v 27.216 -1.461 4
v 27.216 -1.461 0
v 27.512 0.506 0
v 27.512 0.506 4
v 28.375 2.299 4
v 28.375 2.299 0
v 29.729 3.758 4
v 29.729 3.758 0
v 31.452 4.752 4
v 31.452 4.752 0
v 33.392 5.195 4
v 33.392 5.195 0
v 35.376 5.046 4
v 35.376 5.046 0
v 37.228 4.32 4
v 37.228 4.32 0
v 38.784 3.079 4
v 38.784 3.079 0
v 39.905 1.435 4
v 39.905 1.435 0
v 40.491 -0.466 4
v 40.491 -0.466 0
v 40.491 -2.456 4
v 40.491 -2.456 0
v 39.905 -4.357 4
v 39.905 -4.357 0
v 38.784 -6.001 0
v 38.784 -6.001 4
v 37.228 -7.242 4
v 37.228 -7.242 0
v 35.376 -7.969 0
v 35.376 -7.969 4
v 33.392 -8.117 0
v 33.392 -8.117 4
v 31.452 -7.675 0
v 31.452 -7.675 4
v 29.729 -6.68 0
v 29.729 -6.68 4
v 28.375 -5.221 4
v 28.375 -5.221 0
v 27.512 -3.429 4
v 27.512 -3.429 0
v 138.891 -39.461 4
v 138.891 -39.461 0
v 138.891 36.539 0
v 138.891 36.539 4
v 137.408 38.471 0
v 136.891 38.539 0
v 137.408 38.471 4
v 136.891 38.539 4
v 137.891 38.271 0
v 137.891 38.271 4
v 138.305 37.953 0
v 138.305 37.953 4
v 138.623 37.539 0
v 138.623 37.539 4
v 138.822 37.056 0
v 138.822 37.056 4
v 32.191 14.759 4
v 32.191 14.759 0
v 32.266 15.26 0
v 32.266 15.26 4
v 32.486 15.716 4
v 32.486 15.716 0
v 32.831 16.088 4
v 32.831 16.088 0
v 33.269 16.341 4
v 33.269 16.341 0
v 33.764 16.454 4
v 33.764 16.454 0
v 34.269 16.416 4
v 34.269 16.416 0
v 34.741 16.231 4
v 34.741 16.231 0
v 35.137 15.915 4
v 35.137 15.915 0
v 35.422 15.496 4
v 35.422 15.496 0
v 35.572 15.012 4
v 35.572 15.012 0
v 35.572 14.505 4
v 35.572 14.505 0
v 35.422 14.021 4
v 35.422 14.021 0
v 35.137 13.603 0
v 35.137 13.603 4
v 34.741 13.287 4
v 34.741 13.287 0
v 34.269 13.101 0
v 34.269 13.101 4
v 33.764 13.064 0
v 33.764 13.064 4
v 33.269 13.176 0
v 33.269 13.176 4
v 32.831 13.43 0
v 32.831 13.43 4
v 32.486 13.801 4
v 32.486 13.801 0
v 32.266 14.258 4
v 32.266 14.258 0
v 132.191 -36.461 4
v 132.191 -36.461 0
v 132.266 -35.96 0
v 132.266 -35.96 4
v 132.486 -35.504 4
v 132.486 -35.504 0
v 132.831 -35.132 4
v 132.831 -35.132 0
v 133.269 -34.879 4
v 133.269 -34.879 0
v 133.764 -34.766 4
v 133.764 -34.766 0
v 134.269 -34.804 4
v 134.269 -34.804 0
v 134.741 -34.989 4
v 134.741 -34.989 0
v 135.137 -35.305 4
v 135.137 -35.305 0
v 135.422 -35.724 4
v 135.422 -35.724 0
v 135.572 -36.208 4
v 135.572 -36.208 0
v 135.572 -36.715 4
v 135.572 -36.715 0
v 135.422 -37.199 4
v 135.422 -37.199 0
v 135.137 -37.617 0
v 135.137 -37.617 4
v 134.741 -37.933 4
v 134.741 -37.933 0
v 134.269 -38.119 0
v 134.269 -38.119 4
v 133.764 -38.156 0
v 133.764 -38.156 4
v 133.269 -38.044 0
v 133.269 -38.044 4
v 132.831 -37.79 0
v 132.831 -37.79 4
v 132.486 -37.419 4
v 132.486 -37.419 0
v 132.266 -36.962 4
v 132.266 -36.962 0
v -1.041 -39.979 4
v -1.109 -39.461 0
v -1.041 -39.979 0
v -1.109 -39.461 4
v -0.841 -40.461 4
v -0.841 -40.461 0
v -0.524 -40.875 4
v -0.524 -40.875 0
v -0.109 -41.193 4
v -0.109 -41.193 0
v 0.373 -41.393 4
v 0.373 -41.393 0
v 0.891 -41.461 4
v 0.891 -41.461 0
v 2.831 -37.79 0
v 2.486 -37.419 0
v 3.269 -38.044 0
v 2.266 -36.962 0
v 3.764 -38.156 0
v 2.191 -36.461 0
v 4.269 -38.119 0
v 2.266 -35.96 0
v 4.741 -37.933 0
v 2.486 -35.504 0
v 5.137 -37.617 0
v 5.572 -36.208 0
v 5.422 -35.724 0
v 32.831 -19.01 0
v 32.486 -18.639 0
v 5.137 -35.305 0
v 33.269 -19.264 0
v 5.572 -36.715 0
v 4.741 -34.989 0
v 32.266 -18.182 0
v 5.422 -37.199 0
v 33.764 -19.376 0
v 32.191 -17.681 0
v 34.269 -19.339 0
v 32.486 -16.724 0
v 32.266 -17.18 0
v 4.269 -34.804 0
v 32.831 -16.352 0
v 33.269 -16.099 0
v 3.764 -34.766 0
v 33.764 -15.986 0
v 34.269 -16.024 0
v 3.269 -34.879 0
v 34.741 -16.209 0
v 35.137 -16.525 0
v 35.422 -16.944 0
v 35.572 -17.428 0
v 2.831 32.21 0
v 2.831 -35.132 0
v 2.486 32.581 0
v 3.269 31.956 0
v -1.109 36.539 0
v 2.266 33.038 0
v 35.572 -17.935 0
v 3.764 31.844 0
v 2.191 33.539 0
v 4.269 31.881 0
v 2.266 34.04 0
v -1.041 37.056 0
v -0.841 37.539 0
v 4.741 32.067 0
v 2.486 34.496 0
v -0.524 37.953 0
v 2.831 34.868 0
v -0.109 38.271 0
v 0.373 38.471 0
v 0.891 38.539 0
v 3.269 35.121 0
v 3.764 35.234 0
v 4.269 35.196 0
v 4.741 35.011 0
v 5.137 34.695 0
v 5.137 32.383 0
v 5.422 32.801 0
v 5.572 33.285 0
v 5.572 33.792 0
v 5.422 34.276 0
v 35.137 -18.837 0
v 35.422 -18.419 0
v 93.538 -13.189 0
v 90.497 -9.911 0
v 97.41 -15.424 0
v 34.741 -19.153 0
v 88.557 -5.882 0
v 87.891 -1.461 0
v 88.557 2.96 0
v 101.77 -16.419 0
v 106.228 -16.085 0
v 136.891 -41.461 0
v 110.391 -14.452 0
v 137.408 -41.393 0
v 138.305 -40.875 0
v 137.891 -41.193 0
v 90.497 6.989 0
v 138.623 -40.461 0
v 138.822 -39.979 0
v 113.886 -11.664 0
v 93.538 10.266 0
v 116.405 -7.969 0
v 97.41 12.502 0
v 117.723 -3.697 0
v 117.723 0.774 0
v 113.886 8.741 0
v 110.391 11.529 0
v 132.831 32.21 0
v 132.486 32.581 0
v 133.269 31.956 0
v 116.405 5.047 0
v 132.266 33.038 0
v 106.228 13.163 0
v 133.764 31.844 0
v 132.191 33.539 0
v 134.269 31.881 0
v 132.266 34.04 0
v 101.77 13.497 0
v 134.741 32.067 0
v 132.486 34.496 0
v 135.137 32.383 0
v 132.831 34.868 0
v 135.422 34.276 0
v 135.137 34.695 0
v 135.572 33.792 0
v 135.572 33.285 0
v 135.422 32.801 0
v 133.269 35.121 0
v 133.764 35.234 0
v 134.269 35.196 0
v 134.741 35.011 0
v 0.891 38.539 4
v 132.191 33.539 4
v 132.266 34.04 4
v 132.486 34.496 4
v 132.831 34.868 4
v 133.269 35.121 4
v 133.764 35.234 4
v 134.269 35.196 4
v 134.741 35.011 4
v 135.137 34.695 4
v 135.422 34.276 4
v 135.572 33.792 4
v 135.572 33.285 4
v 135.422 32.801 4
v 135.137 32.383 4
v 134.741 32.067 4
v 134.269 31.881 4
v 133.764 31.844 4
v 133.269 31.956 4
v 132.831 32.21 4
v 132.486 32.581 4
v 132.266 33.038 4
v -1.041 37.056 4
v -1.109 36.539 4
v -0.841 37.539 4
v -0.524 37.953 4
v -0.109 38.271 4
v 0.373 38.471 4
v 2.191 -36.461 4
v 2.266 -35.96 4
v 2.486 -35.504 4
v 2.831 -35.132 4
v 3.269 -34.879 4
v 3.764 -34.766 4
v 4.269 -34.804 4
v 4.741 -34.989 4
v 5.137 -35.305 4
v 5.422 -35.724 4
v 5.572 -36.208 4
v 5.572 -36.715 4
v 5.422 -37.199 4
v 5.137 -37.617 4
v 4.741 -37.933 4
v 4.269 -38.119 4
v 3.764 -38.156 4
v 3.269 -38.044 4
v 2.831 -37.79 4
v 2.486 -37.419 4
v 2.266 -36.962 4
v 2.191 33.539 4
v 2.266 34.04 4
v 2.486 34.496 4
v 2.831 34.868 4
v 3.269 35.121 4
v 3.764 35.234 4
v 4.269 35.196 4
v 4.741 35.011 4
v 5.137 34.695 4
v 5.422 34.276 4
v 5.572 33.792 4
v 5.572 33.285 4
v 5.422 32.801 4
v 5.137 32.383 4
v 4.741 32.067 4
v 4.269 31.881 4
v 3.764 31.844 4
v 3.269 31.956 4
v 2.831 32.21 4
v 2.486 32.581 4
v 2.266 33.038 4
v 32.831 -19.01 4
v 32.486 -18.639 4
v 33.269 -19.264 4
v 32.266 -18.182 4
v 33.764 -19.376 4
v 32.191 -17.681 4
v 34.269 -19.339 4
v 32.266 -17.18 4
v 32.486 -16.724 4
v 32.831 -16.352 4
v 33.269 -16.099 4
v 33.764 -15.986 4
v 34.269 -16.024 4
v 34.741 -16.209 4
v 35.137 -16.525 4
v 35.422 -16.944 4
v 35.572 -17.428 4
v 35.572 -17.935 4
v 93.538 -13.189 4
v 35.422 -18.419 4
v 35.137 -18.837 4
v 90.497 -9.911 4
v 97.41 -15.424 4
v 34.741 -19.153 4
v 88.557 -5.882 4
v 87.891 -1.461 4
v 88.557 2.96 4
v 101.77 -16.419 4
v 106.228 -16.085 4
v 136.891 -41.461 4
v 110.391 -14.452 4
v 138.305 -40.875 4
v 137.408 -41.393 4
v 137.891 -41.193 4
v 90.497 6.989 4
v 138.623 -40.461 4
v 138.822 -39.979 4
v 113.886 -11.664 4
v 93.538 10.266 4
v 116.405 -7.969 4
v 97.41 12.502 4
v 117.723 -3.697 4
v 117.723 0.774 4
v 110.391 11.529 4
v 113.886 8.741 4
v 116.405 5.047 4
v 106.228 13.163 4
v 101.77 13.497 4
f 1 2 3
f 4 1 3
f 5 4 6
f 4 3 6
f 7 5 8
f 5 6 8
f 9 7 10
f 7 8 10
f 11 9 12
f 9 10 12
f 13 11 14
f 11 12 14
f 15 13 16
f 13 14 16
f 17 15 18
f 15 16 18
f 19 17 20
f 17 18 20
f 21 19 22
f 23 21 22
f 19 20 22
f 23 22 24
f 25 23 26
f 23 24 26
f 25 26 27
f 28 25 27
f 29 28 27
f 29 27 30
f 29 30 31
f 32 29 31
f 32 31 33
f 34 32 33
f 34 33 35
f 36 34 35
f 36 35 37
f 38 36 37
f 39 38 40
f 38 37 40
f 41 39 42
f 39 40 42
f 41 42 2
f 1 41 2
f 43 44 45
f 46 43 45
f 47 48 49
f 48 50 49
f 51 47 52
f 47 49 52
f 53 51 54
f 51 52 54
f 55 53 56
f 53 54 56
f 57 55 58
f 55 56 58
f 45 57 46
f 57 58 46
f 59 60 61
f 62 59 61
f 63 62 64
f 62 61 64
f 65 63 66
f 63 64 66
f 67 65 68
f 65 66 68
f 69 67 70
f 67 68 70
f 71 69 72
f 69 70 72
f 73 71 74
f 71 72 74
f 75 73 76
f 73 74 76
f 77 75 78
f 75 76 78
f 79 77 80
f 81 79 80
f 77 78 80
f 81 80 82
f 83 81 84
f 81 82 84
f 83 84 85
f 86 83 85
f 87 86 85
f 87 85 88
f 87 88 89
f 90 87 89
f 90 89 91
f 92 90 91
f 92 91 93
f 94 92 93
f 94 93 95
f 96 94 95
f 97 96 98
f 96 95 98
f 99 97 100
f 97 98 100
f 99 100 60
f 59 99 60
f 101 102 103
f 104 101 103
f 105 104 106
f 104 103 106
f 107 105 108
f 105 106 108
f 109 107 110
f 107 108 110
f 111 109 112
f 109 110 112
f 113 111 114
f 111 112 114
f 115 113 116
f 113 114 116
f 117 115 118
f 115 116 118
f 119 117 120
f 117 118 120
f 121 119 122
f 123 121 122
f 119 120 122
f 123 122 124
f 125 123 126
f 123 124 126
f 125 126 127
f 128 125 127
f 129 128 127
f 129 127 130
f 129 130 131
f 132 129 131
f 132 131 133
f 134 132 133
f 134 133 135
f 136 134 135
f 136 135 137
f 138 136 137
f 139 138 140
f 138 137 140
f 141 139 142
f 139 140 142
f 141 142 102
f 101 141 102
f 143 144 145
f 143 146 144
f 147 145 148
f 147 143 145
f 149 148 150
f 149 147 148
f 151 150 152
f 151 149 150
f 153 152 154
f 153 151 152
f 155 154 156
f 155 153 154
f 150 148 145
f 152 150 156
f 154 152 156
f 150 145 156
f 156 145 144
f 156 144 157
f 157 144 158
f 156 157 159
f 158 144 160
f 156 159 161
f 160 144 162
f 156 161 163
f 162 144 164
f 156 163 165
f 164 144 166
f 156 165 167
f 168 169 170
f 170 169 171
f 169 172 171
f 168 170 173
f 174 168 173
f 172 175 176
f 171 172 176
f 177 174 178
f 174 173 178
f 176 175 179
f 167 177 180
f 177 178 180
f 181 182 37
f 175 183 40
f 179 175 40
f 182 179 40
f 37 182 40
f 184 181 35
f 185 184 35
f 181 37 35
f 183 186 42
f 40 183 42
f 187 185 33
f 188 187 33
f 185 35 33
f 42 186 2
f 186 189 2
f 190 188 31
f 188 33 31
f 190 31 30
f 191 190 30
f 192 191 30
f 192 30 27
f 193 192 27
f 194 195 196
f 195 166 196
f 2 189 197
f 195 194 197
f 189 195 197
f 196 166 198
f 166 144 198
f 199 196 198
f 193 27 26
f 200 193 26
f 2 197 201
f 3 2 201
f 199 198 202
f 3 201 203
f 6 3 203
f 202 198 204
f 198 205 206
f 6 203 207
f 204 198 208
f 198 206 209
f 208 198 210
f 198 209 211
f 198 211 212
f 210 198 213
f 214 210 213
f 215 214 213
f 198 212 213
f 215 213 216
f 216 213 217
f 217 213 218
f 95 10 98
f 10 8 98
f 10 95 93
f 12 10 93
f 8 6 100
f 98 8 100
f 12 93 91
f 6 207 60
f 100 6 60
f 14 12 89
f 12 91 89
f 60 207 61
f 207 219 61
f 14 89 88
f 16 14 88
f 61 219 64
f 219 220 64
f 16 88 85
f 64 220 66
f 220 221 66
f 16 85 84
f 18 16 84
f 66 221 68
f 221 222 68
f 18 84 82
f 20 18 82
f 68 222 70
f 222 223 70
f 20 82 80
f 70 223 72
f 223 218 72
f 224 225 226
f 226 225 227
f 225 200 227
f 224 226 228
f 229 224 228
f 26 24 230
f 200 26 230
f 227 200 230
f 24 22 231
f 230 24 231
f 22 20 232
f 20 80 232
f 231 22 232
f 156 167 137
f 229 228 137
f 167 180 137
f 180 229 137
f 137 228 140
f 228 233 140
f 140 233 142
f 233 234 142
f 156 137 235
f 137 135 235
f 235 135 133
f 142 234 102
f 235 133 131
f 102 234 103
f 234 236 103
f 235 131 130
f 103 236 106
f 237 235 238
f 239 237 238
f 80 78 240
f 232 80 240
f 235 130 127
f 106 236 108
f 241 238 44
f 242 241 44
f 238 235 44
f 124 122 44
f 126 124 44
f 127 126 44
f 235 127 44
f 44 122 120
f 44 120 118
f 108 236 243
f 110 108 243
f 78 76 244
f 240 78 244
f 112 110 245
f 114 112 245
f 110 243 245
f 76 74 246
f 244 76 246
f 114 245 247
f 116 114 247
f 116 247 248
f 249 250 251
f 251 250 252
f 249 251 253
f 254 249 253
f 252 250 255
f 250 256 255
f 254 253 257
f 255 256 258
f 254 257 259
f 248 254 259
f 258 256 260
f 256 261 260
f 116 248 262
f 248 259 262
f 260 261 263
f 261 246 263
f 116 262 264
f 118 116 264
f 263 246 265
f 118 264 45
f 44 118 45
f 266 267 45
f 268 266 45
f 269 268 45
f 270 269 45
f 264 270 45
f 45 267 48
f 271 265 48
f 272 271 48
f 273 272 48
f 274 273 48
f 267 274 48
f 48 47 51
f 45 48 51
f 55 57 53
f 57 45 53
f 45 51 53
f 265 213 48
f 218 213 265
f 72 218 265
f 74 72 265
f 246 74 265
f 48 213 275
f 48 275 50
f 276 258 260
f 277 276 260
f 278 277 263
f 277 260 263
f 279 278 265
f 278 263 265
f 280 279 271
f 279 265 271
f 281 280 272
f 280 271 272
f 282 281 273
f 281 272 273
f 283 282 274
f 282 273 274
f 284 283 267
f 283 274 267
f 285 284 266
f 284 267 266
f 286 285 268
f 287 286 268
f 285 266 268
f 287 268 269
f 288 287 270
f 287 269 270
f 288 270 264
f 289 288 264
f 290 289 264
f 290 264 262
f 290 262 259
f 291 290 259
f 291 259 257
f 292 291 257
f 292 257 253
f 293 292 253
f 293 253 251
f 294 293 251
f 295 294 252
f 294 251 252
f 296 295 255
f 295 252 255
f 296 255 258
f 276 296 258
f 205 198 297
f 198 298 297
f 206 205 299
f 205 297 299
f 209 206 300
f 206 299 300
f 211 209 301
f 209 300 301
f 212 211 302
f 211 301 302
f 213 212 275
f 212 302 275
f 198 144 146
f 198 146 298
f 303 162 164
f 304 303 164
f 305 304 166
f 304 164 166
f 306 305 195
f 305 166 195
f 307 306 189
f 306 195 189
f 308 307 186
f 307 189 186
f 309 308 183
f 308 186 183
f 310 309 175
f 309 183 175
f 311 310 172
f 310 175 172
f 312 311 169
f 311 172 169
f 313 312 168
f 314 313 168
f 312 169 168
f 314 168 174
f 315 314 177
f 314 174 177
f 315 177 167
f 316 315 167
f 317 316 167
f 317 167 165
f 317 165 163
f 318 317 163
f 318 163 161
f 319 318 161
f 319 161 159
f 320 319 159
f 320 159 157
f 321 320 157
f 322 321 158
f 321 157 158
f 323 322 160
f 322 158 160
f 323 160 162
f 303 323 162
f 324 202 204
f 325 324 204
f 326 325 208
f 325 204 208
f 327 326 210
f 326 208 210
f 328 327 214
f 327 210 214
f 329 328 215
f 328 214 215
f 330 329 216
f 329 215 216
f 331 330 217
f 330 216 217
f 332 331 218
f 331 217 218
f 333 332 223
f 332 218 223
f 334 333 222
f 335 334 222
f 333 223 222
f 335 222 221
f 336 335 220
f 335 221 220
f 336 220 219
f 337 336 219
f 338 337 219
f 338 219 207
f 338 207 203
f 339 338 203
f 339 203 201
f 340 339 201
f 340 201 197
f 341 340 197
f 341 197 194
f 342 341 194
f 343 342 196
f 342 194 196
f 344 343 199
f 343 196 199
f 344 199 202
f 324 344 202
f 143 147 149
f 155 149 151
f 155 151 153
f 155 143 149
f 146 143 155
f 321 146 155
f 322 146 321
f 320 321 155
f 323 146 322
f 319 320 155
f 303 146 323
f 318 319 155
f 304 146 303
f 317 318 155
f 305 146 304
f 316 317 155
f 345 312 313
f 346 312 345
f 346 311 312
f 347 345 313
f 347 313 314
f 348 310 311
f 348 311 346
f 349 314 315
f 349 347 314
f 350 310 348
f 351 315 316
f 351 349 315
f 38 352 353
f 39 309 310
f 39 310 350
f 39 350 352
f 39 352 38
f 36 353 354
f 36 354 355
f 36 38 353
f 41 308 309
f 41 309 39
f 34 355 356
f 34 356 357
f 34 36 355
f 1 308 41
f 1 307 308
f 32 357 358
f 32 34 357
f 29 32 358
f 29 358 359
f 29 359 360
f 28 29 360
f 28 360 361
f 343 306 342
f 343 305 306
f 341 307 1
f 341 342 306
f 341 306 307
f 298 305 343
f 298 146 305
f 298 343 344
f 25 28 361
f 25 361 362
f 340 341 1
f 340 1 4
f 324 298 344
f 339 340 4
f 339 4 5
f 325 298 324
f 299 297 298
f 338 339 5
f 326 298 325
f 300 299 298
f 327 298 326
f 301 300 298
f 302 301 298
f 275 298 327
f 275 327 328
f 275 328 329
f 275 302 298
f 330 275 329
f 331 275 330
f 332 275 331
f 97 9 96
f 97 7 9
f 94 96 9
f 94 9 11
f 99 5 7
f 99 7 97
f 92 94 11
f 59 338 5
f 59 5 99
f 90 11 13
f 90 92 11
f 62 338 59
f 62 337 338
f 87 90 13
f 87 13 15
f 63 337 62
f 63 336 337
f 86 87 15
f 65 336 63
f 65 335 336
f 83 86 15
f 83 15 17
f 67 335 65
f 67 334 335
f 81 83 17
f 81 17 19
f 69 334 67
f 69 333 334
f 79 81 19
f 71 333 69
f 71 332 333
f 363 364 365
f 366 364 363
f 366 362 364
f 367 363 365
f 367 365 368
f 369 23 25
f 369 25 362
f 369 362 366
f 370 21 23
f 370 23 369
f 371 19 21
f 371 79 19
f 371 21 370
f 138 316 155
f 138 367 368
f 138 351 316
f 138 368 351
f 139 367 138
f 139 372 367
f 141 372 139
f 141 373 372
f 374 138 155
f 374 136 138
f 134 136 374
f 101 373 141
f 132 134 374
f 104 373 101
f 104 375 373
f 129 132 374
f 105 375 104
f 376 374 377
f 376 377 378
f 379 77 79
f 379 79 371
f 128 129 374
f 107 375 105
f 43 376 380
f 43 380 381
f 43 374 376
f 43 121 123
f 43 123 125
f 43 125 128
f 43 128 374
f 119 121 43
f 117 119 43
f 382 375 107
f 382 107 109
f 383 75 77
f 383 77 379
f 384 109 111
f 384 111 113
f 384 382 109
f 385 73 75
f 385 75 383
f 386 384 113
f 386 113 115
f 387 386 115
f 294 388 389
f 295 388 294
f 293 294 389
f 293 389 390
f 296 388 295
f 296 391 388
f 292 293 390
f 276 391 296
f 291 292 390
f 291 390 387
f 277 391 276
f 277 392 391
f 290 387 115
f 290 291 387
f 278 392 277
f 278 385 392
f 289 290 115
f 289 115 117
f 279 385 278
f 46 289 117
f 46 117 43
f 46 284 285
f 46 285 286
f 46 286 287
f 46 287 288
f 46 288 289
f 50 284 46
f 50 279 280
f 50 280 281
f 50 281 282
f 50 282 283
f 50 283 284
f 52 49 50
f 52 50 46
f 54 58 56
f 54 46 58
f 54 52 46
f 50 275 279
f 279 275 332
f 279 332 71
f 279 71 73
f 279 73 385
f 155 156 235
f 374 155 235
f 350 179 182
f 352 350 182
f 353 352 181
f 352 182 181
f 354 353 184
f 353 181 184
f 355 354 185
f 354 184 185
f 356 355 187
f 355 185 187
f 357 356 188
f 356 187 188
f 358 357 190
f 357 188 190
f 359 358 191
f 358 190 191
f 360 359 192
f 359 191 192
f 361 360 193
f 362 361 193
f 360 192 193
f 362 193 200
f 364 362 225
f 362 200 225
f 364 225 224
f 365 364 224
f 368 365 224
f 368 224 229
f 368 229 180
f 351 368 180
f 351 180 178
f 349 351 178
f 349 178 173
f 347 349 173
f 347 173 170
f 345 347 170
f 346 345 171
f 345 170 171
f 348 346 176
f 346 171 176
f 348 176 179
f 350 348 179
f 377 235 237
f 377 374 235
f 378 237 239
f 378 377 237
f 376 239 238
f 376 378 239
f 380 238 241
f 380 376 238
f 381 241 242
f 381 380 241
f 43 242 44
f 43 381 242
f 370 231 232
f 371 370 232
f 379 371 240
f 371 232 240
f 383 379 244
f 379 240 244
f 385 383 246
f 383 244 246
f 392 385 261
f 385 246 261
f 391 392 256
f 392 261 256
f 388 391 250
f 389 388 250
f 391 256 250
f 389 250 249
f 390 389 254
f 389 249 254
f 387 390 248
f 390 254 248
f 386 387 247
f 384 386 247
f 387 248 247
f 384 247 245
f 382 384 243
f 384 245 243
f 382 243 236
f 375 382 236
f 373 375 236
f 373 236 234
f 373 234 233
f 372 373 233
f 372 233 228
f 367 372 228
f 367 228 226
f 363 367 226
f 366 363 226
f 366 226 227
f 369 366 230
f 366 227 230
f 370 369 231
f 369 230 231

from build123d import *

# Parameters (mm, degrees)
SKETCH1_W           = 140
SKETCH1_H           = 80
BOSS_EXTRUDE1_DEPTH = 4
SKETCH2_R           = 6.675
SKETCH2_R_2         = 1.7
SKETCH2_R_3         = 15
CUT_EXTRUDE1_DEPTH  = 4
FILLET1_R           = 2


with BuildPart() as part:
    # Sketch1 → Boss-Extrude1 (new body)
    with BuildSketch(Plane.XY):
        with Locations((68.890553518, -1.461144776)):
            Rectangle(SKETCH1_W, SKETCH1_H)
    extrude(amount=BOSS_EXTRUDE1_DEPTH)

    # Sketch2 → Cut-Extrude1 (cut)
    with BuildSketch(Plane(origin=(0, 0, 0), x_dir=(-1, 0, 0), z_dir=(0, 0, -1))):
        with Locations((-33.890553518, -1.461144776)):
            Circle(SKETCH2_R)
        with Locations((-33.890553518, 14.758855224)):
            Circle(SKETCH2_R_2)
        with Locations((-33.890553518, -17.681144776)):
            Circle(SKETCH2_R_2)
        with Locations((-3.890553518, -36.461144776)):
            Circle(SKETCH2_R_2)
        with Locations((-133.890553518, -36.461144776)):
            Circle(SKETCH2_R_2)
        with Locations((-133.890553518, 33.538855224)):
            Circle(SKETCH2_R_2)
        with Locations((-3.890553518, 33.538855224)):
            Circle(SKETCH2_R_2)
        with Locations((-102.890553518, -1.461144776)):
            Circle(SKETCH2_R_3)
    extrude(amount=-CUT_EXTRUDE1_DEPTH, mode=Mode.SUBTRACT)

    # Fillet1
    fillet1_edges = [part.edges().sort_by_distance(p)[0] for p in [
        (-1.109446482, 38.538855224, 2),
        (138.890553518, 38.538855224, 2),
        (138.890553518, -41.461144776, 2),
        (-1.109446482, -41.461144776, 2),
    ]]
    fillet(fillet1_edges, radius=FILLET1_R)


solid = part.part
